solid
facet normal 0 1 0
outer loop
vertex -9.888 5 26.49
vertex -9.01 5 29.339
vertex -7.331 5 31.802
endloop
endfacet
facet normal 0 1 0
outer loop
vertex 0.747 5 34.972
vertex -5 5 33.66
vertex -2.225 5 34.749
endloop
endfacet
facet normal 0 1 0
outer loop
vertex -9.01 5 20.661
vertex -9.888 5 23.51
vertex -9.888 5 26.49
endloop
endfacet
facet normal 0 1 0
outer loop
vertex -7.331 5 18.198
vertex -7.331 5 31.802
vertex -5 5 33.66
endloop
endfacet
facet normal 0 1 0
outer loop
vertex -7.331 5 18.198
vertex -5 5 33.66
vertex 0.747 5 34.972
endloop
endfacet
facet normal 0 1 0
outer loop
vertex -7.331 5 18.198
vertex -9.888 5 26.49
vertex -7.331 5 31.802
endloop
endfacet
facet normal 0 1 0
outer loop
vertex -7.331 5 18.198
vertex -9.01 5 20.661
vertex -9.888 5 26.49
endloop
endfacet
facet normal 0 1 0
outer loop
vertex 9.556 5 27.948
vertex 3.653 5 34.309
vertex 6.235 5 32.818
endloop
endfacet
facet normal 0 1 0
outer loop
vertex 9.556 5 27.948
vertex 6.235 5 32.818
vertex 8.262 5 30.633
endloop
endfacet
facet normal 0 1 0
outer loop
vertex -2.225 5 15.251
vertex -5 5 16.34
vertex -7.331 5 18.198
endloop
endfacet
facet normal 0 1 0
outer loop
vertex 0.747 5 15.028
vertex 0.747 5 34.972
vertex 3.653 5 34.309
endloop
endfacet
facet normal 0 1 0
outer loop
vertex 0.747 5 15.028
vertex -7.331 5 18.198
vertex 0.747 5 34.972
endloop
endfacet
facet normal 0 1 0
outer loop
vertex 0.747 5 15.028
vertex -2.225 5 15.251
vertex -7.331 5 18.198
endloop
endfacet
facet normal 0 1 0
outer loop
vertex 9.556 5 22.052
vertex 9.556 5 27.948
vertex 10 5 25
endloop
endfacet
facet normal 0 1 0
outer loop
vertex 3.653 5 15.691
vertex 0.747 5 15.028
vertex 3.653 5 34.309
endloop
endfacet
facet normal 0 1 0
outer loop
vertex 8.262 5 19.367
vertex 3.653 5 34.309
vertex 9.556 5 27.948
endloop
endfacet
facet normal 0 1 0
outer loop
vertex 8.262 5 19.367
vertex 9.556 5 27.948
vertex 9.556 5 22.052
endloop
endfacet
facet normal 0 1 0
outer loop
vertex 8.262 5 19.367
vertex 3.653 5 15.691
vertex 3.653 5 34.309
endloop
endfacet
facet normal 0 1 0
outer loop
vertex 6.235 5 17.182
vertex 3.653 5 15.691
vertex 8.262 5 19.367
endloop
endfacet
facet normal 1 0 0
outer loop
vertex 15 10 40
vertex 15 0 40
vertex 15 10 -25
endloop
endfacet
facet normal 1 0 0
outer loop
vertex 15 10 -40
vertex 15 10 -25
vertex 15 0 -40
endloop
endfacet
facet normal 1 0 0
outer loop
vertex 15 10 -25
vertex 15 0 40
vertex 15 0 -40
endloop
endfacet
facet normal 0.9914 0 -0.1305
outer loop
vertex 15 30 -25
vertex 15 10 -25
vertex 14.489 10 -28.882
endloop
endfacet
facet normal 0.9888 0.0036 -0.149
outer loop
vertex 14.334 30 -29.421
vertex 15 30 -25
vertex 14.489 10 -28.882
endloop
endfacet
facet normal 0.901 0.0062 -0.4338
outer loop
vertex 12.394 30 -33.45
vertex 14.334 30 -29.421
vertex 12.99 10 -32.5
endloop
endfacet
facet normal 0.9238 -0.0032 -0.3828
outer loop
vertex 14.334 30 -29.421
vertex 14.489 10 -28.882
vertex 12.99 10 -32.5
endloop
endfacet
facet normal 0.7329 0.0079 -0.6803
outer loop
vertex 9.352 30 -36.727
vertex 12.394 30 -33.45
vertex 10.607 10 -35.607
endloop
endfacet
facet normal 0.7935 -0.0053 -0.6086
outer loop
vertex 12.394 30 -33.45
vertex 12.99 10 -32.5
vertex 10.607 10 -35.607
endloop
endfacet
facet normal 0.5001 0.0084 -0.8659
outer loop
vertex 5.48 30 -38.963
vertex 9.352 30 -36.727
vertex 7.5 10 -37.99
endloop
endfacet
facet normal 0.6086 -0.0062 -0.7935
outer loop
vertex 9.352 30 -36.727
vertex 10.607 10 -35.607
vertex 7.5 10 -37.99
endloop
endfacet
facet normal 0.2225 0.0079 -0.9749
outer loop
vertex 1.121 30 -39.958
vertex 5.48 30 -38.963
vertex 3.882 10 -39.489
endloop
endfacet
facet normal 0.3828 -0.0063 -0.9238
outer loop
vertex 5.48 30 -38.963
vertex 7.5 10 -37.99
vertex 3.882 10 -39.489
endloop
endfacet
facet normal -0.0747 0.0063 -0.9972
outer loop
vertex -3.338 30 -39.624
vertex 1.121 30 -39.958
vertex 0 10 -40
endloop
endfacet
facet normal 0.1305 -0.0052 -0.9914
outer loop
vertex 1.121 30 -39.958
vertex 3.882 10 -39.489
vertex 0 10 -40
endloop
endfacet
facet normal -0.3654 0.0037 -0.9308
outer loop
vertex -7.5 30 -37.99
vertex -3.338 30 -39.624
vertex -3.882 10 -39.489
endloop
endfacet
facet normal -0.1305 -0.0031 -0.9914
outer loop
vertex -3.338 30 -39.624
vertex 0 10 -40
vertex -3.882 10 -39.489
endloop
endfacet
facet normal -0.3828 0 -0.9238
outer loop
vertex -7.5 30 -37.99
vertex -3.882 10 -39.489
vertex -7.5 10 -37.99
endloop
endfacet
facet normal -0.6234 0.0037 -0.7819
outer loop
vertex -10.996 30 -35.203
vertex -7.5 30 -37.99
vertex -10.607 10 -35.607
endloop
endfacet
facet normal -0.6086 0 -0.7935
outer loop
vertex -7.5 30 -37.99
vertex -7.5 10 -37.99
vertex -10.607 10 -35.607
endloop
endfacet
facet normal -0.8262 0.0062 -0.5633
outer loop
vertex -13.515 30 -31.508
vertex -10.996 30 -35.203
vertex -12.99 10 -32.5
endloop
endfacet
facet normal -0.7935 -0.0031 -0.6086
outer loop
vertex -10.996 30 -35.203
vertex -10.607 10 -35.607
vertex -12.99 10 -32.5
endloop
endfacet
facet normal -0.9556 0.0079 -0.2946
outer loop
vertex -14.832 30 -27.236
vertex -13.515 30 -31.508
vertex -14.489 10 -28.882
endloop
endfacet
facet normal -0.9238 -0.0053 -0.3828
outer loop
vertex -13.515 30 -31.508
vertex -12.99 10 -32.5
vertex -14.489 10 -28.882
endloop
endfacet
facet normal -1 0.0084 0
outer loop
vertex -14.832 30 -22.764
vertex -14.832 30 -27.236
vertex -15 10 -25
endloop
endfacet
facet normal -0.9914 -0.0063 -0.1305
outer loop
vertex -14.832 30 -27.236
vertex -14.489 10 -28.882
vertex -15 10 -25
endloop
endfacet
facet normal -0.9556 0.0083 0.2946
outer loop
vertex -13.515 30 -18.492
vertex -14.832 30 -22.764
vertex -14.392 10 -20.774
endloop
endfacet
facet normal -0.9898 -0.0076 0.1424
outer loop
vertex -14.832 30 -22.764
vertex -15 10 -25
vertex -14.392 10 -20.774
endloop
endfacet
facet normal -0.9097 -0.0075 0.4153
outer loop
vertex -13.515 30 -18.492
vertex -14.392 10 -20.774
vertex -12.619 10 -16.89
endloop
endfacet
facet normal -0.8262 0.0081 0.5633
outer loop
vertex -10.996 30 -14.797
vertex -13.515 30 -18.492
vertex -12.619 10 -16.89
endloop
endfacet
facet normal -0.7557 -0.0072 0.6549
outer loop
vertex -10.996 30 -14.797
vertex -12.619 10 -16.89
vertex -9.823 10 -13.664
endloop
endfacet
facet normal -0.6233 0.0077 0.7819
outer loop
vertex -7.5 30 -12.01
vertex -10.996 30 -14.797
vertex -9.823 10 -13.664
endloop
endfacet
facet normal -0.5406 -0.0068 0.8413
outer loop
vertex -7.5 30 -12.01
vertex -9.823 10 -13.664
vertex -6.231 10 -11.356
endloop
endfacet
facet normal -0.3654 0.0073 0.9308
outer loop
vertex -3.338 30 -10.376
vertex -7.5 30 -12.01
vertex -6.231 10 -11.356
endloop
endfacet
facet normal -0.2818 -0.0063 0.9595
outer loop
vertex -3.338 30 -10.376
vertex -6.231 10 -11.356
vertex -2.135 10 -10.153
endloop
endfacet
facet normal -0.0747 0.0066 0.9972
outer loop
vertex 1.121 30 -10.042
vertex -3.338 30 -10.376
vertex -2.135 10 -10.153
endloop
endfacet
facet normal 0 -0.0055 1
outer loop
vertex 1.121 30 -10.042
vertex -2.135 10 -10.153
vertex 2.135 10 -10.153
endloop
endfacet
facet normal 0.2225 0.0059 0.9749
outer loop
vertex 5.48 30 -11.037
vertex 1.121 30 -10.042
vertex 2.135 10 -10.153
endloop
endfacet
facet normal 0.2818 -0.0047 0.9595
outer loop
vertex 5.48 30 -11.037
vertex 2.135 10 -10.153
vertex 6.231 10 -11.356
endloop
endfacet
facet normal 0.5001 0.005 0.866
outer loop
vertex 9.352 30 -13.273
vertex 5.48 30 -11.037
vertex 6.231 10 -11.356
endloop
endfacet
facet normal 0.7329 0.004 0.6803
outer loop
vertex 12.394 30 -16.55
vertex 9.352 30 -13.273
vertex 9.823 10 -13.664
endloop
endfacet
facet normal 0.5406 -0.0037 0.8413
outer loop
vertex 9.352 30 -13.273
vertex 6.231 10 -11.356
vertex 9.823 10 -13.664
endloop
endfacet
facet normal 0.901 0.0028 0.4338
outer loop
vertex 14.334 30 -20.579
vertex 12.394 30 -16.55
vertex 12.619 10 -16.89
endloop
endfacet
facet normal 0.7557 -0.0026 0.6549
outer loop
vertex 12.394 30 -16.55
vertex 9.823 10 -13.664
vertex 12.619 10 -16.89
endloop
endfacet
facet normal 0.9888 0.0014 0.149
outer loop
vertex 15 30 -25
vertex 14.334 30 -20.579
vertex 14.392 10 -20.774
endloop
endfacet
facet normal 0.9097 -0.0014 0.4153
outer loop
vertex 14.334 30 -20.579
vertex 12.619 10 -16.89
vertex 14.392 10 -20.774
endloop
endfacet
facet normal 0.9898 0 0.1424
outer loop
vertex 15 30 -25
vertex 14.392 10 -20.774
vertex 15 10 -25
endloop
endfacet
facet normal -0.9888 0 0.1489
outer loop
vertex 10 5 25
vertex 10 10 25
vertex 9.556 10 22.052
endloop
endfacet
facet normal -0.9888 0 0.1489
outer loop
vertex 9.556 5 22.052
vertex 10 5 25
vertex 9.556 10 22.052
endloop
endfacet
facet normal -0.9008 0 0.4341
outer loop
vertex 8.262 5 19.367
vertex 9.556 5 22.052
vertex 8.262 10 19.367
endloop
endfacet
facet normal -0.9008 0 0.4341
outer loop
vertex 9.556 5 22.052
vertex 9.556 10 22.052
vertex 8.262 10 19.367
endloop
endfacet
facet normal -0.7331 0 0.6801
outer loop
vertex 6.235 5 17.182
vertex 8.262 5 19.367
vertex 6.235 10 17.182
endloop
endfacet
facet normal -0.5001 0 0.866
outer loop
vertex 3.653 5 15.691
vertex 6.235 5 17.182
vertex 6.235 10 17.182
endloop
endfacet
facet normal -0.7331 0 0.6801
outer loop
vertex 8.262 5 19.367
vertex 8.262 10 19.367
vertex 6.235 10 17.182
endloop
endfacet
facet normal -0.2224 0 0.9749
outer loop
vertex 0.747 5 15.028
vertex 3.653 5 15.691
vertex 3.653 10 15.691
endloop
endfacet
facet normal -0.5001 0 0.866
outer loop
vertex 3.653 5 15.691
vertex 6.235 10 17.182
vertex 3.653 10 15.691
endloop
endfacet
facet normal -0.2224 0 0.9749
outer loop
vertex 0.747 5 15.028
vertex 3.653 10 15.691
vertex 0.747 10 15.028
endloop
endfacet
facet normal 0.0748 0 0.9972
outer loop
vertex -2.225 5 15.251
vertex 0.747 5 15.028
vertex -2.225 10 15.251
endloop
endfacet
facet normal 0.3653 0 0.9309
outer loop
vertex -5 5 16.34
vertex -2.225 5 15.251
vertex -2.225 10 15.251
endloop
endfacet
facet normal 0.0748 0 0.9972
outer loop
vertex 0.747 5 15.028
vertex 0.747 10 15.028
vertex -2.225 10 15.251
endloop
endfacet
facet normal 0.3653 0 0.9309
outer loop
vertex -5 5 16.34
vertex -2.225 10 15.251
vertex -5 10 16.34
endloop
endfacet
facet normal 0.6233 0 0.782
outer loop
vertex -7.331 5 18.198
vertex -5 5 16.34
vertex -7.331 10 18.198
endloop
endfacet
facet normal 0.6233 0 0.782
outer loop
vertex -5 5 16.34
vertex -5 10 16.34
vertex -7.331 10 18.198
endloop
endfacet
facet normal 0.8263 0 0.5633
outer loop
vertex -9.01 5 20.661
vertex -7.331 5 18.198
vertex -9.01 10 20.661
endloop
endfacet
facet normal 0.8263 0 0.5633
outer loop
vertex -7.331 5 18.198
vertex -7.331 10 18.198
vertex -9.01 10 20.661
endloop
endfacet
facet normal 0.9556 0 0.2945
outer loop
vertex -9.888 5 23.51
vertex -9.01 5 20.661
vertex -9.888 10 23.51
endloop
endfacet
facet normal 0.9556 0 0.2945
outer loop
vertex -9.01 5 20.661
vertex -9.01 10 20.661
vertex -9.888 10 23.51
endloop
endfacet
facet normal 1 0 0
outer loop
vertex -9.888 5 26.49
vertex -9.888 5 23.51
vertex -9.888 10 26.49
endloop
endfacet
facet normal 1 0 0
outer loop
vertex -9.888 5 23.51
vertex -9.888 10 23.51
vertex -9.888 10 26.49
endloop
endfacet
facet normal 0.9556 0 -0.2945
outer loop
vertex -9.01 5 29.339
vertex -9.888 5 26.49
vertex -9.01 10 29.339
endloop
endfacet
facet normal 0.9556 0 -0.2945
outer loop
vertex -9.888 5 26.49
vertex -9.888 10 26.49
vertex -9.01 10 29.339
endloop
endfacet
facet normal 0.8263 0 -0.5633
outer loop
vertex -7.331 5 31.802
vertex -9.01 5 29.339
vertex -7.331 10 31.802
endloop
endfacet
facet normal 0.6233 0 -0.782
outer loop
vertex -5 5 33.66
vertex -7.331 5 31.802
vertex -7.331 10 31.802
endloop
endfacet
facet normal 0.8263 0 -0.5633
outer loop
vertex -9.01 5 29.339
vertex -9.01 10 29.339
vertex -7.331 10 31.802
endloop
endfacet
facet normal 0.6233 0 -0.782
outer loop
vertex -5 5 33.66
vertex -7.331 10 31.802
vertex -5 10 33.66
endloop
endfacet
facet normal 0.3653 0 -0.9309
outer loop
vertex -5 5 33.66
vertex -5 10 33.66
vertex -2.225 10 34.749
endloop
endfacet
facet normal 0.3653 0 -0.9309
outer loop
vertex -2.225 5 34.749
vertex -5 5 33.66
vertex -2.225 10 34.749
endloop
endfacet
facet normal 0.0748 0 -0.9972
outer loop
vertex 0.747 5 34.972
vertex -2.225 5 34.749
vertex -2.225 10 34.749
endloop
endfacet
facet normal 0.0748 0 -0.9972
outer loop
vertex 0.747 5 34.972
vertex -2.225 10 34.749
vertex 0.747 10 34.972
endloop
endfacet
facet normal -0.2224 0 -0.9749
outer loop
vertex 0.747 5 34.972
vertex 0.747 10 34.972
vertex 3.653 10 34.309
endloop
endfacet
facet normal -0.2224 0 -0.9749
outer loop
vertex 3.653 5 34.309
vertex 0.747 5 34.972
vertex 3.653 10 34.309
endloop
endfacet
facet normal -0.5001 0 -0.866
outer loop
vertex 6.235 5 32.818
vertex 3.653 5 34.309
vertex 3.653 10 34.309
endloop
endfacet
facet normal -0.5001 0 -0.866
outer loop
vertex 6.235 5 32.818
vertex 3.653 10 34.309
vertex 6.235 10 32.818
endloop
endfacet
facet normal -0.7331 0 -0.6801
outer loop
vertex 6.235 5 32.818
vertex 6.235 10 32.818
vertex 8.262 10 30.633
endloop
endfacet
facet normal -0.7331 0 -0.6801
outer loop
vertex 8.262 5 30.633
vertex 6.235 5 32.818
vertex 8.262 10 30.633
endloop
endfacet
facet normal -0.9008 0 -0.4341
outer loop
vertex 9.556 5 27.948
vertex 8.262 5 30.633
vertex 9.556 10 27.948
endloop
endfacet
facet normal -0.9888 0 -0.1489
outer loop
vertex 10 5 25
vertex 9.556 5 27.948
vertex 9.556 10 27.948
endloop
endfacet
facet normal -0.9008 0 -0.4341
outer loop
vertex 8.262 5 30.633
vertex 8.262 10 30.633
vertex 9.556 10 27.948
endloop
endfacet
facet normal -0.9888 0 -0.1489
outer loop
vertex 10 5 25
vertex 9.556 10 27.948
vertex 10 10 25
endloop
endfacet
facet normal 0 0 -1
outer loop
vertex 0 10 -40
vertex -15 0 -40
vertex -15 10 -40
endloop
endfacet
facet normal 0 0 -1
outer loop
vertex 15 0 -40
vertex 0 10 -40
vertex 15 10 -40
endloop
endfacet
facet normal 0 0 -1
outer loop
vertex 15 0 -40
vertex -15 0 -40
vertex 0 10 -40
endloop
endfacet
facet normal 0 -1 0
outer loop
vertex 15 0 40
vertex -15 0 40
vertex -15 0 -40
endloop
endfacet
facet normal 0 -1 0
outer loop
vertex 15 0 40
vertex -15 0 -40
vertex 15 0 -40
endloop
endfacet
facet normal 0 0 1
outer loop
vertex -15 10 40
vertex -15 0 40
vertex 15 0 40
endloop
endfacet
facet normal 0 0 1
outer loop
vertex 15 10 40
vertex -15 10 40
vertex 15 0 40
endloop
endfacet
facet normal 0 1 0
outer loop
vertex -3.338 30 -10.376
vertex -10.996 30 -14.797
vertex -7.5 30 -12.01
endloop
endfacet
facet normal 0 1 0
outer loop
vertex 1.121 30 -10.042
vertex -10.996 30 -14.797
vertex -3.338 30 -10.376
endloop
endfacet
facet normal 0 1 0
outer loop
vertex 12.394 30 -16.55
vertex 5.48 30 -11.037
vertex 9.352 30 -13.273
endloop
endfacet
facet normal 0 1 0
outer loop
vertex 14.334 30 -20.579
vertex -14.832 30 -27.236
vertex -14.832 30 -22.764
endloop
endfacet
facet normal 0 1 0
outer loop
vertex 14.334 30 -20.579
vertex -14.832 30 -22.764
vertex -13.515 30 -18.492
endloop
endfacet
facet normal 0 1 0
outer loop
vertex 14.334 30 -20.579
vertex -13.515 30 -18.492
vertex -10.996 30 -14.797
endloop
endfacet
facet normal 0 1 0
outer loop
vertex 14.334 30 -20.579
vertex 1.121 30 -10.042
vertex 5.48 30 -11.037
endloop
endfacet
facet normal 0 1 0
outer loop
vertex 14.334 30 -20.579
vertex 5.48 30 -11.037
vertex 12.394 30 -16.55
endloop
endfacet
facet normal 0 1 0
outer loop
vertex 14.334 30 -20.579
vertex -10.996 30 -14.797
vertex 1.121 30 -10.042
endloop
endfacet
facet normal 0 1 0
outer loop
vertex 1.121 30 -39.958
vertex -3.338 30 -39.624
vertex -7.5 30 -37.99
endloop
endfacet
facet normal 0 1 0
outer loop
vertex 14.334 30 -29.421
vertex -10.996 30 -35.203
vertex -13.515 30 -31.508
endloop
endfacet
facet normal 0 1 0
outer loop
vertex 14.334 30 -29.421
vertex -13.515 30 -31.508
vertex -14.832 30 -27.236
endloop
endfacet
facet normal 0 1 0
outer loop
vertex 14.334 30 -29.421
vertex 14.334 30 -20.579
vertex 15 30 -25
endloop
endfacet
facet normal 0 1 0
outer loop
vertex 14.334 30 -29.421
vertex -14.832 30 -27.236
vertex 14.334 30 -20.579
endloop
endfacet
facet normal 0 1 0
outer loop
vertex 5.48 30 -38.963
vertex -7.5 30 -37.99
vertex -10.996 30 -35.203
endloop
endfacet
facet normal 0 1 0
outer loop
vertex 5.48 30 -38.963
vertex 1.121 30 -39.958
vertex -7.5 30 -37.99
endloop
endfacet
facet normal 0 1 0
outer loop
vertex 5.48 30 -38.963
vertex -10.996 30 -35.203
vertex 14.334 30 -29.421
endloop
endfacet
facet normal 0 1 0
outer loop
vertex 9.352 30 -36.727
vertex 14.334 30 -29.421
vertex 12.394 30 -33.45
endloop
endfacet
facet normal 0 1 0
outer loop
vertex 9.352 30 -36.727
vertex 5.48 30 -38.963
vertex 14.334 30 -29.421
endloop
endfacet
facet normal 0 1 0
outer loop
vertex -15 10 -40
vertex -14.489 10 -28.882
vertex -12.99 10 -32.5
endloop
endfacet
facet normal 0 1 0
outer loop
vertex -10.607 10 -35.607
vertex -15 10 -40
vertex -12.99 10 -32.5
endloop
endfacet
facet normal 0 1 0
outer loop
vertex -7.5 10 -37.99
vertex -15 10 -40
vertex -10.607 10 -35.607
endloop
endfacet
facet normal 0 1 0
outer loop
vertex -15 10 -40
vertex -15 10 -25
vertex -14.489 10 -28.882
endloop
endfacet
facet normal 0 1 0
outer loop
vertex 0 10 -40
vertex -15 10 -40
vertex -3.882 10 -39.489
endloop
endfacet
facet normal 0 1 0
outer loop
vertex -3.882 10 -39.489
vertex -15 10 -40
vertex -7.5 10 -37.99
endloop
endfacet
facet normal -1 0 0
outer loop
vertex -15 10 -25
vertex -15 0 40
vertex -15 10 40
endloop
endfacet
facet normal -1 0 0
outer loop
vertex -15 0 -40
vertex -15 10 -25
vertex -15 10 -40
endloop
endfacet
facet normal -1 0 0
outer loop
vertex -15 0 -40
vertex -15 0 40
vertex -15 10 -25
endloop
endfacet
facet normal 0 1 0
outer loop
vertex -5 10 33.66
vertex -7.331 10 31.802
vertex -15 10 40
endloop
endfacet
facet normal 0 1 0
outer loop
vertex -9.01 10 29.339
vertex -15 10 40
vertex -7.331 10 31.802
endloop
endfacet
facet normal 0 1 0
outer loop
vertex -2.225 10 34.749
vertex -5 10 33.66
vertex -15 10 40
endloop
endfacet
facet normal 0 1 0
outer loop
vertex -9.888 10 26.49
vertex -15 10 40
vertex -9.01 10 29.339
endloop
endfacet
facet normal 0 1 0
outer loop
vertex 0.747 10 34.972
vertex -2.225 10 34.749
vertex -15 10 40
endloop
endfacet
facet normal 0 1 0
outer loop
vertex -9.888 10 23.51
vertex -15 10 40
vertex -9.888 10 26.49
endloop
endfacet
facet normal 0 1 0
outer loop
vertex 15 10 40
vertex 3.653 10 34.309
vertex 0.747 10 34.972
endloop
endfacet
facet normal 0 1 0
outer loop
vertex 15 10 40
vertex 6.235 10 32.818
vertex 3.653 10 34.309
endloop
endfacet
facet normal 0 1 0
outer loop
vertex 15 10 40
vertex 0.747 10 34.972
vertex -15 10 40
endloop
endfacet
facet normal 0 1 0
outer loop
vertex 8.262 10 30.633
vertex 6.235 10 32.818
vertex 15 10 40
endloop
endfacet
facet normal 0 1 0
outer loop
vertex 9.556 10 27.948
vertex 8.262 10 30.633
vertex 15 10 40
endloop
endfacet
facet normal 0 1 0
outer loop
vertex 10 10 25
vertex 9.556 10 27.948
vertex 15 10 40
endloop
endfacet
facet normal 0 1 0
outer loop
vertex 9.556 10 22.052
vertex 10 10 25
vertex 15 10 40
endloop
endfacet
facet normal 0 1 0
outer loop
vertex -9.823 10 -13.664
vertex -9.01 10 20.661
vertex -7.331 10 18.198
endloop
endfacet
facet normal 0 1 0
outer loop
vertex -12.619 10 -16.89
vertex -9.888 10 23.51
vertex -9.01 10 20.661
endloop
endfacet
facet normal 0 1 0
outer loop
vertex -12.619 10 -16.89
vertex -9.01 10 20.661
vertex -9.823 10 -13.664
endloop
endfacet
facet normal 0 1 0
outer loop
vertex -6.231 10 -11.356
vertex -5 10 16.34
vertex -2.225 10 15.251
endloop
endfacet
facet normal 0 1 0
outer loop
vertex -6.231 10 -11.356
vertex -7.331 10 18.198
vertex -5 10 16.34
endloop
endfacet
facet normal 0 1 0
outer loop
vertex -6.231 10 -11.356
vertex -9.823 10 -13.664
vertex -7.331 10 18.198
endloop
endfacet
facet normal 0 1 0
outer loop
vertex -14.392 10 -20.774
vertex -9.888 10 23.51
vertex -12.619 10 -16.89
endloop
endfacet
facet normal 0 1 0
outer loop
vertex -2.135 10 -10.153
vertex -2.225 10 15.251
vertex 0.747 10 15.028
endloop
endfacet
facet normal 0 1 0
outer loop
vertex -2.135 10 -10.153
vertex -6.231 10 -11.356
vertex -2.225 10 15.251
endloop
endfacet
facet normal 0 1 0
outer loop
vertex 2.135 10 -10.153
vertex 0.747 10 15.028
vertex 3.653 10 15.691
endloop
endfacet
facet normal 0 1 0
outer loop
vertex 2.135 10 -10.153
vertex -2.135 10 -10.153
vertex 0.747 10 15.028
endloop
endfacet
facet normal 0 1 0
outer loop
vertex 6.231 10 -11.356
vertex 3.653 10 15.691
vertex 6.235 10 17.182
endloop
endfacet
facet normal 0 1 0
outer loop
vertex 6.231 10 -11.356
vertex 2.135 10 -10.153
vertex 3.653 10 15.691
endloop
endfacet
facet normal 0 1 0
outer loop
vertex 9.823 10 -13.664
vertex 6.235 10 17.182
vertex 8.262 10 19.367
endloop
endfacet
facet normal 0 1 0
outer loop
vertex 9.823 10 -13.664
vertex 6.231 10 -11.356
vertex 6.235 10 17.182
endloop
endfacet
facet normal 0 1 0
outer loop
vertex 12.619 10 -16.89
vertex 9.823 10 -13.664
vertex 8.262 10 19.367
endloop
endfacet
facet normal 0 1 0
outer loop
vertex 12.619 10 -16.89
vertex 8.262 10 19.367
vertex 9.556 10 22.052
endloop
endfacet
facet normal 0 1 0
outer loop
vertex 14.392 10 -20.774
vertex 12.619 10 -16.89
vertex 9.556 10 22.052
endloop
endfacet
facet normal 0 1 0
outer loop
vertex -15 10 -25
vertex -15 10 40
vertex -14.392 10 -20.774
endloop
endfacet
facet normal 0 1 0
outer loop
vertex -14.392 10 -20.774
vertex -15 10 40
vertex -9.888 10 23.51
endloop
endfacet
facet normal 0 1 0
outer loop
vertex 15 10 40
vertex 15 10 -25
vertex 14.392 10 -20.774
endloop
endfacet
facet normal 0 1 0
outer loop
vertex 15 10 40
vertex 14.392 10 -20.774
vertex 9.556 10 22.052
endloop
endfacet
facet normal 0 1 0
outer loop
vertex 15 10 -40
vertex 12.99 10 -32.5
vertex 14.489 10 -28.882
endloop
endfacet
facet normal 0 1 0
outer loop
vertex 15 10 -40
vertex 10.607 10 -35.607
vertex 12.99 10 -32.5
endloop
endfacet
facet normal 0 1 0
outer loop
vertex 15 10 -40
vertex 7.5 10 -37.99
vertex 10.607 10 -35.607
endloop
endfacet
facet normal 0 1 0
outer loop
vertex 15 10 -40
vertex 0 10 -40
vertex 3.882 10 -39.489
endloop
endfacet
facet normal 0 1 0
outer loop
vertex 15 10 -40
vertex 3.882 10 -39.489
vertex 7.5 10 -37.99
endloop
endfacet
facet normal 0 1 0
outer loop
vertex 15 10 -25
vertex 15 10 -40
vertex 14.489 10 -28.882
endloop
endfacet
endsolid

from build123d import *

# Parameters (mm, degrees)
SKETCH1_W           = 30
SKETCH1_H           = 80
BOSS_EXTRUDE1_DEPTH = 10
SKETCH2_R           = 15
BOSS_EXTRUDE2_DEPTH = 20
SKETCH3_R           = 10
CUT_EXTRUDE1_DEPTH  = 5


with BuildPart() as part:
    # Sketch1 → Boss-Extrude1 (new body)
    with BuildSketch(Plane(origin=(0, 0, 0), x_dir=(1, 0, 0), z_dir=(0, 1, 0))):
        Rectangle(SKETCH1_W, SKETCH1_H)
    extrude(amount=BOSS_EXTRUDE1_DEPTH)

    # Sketch2 → Boss-Extrude2 (add)
    with BuildSketch(Plane(origin=(0, 10, 0), x_dir=(1, 0, 0), z_dir=(0, 1, 0))):
        with Locations((0, 25)):
            Circle(SKETCH2_R)
    extrude(amount=BOSS_EXTRUDE2_DEPTH)

    # Sketch3 → Cut-Extrude1 (cut)
    with BuildSketch(Plane(origin=(0, 10, 0), x_dir=(1, 0, 0), z_dir=(0, 1, 0))):
        with Locations((0, -25)):
            Circle(SKETCH3_R)
    extrude(amount=-CUT_EXTRUDE1_DEPTH, mode=Mode.SUBTRACT)


solid = part.part
